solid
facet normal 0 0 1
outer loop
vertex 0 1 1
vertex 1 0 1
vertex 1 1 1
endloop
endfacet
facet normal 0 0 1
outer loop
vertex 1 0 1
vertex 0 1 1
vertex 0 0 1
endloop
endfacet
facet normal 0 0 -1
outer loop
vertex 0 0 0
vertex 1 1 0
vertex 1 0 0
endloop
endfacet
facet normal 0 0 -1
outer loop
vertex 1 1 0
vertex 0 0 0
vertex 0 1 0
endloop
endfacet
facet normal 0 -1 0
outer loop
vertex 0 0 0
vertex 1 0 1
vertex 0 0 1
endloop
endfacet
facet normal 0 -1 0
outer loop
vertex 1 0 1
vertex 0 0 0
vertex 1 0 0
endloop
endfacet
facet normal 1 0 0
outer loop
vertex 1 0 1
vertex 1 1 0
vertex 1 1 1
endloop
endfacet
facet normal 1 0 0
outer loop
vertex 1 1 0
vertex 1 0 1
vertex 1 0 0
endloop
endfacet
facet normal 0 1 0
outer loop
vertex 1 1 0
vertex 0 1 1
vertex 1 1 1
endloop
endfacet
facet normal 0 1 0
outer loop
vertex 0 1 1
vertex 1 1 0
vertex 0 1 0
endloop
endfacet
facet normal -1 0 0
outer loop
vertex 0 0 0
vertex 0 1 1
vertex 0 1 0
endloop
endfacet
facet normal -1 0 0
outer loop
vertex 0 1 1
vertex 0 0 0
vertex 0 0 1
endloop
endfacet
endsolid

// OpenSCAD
    // translate( [0, 0, stop_height] )
  // cylinder ()
  // translate( [-R_pipe-R_male, 0, male_height-2] )
  // rotate( [90, 0, 0] )
  //   emptyLoop(
  //     cr=R_pipe,
  //     rin=d_male/2,
  //     rout=R_male,
  //     angle=90,
  //     $step=1
  //   );

  // female( d=D_male, D=D_male+4, height=male_height, pitch=1.2 );

cube([1, 1, 1]);
